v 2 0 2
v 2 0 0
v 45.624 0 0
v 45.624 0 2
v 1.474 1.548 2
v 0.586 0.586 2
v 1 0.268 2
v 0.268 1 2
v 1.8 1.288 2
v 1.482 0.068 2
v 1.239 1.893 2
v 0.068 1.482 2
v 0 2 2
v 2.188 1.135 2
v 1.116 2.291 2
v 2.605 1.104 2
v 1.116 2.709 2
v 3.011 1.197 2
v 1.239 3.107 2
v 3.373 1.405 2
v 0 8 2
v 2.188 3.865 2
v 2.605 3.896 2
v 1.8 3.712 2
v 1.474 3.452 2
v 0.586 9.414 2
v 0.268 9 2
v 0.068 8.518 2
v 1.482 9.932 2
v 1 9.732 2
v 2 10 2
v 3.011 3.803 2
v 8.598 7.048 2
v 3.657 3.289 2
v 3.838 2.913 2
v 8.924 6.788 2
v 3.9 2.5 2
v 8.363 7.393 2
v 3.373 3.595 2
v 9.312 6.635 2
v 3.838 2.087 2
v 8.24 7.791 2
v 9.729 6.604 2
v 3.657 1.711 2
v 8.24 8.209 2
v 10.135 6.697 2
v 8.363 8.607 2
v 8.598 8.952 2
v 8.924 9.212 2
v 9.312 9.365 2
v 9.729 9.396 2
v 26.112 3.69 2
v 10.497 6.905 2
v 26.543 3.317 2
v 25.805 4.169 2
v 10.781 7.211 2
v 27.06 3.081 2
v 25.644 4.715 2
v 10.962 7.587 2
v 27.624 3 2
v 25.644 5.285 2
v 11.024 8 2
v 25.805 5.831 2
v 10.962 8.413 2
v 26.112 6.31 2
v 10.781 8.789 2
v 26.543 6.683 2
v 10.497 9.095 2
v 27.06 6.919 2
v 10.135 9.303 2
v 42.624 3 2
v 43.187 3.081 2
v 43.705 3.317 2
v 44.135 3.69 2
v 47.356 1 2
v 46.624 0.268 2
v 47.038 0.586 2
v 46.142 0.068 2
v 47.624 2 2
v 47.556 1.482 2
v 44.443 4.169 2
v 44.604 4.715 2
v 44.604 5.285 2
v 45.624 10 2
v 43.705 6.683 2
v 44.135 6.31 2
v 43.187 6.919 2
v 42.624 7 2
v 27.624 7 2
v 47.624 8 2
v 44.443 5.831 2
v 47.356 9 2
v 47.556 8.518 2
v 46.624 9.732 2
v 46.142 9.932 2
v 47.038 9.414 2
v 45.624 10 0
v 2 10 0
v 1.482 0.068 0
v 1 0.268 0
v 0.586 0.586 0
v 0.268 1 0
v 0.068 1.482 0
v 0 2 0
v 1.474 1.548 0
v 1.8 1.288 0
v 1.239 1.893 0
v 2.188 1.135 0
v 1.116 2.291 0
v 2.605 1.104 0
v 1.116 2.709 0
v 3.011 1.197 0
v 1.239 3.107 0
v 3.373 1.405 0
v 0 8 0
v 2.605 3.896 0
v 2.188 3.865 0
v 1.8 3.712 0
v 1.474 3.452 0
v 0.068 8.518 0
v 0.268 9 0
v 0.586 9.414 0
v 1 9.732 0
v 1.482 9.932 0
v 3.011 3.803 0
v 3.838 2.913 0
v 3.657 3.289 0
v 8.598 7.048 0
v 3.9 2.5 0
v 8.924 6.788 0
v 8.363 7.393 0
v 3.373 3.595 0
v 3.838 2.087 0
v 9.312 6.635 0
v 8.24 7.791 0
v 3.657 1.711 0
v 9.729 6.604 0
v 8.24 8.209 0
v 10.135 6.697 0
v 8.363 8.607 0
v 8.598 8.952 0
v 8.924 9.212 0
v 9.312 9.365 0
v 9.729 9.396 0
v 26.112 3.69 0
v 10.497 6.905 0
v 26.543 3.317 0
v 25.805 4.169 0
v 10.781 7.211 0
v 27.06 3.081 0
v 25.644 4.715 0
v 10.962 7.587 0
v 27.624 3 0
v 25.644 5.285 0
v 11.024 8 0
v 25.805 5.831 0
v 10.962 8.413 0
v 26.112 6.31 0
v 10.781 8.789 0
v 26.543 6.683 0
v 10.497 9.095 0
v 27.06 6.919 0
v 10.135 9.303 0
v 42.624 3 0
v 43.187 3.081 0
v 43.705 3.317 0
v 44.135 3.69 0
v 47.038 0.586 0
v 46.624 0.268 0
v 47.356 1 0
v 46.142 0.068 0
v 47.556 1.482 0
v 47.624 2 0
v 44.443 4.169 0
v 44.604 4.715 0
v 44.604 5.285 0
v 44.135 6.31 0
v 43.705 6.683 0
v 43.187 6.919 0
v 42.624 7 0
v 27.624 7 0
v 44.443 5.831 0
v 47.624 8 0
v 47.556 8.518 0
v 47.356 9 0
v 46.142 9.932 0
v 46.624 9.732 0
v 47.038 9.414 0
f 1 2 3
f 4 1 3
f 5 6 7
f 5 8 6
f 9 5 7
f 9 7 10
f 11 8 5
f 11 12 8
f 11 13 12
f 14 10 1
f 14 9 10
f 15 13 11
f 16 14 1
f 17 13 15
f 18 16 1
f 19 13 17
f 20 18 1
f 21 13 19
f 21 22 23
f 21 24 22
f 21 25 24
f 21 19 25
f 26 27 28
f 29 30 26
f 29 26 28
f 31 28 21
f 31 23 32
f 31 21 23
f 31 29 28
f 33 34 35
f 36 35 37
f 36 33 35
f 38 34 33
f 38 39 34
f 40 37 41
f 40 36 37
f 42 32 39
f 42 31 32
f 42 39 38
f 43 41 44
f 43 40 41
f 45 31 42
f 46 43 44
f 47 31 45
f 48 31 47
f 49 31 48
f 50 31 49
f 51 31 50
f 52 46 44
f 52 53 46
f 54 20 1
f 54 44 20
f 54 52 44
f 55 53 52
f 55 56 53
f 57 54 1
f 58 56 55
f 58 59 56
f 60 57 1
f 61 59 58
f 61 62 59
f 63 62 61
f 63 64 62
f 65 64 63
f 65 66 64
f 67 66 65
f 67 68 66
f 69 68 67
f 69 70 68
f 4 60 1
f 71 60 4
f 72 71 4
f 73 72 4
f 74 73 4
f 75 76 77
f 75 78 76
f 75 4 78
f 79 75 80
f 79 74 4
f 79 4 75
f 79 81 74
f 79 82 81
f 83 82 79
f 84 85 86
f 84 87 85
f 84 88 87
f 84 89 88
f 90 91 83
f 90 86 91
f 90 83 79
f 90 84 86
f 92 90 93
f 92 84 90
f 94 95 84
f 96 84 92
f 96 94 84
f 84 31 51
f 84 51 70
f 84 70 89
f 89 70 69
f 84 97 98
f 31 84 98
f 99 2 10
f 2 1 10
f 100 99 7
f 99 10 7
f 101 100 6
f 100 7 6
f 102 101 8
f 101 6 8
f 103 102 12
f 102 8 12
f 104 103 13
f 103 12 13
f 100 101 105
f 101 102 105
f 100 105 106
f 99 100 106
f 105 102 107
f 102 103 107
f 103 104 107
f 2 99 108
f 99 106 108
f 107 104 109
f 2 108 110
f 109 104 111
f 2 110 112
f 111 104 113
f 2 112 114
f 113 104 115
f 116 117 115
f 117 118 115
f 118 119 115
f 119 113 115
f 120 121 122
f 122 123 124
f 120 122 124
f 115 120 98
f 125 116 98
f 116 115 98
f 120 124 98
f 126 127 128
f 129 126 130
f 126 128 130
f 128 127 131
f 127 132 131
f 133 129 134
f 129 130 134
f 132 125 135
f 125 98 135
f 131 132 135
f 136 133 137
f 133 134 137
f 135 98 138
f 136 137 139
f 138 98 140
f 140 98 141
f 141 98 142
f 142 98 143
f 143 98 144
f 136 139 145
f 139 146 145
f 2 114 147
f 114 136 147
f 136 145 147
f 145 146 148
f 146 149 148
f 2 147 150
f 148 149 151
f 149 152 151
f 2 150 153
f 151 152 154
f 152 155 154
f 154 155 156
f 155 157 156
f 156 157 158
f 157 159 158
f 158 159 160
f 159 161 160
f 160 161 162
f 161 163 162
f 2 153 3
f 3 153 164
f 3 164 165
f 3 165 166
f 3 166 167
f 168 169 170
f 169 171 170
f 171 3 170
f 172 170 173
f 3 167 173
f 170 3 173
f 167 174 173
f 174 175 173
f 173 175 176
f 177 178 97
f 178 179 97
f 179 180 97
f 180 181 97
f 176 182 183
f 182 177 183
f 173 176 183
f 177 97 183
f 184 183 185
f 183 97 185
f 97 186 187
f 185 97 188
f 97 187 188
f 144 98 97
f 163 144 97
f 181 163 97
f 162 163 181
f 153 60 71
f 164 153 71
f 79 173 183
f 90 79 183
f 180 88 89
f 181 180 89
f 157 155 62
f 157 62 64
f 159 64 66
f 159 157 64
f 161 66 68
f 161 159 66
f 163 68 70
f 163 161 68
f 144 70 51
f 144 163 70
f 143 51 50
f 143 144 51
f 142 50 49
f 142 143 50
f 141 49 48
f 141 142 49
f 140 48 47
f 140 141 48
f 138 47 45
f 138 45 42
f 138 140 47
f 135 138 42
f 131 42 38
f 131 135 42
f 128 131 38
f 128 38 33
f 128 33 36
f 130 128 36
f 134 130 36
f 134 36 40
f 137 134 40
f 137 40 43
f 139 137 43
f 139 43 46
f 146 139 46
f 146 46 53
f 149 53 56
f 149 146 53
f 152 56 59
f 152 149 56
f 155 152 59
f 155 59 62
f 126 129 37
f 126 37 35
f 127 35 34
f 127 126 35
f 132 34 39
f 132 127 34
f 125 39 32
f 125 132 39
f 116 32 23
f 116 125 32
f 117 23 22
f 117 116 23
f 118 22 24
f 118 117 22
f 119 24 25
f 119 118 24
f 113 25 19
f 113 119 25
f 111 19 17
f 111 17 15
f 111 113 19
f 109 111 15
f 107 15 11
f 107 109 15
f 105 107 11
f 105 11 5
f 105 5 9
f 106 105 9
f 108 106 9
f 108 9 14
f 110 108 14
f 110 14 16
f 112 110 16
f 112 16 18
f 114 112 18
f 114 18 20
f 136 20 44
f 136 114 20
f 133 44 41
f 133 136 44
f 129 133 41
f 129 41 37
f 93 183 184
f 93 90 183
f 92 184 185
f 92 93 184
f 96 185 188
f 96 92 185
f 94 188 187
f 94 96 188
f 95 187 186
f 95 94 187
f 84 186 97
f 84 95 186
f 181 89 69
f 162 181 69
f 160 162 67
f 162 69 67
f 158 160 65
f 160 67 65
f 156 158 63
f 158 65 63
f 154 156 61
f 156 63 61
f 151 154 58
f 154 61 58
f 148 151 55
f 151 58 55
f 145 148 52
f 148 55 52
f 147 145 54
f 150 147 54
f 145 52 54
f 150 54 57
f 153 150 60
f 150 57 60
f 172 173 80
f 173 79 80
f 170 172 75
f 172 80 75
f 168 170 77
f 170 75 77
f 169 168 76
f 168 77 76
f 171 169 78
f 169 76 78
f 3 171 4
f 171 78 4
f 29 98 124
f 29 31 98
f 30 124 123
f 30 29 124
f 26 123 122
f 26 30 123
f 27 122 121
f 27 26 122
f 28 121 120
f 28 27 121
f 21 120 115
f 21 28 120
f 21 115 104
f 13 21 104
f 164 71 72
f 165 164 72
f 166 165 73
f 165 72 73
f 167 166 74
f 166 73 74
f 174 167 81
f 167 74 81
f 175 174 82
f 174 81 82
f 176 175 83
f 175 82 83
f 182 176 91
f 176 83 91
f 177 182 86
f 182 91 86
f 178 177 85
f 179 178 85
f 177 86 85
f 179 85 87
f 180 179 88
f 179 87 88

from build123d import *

# Parameters (mm, degrees)
F0_R     = 1.4
F1_DEPTH = 2
F2_R     = 2
F4_DEPTH = 2.001


with BuildPart() as f1:
    # F0 (on Top) → F1 (new body)
    with BuildSketch(Plane.XY):
        Polygon((47.623903, 0), (47.623903, 10), (13.023903, 10), (0, 10), (0, 0), align=None)
        with Locations((2.5, 2.5)):
            Circle(F0_R, mode=Mode.SUBTRACT)
        with Locations((9.623903, 8)):
            Circle(F0_R, mode=Mode.SUBTRACT)
    extrude(amount=F1_DEPTH)

    # F2
    f2_edges = [f1.edges().sort_by_distance(p)[0] for p in [
        (0, 0, 1),
        (0, 10, 1),
        (47.623903, 0, 1),
        (47.623903, 10, 1),
    ]]
    fillet(f2_edges, radius=F2_R)

    # F3 (on face) → F4 (cut, through all)
    with BuildSketch(Plane.XY.offset(2)):
        with BuildLine():
            ThreePointArc((42.623903, 3), (44.623903, 5), (42.623903, 7))
            Line((42.623903, 7), (27.623903, 7))
            ThreePointArc((27.623903, 7), (25.623903, 5), (27.623903, 3))
            Line((27.623903, 3), (42.623903, 3))
        make_face()
    extrude(amount=-F4_DEPTH, mode=Mode.SUBTRACT)


solid = f1.part
